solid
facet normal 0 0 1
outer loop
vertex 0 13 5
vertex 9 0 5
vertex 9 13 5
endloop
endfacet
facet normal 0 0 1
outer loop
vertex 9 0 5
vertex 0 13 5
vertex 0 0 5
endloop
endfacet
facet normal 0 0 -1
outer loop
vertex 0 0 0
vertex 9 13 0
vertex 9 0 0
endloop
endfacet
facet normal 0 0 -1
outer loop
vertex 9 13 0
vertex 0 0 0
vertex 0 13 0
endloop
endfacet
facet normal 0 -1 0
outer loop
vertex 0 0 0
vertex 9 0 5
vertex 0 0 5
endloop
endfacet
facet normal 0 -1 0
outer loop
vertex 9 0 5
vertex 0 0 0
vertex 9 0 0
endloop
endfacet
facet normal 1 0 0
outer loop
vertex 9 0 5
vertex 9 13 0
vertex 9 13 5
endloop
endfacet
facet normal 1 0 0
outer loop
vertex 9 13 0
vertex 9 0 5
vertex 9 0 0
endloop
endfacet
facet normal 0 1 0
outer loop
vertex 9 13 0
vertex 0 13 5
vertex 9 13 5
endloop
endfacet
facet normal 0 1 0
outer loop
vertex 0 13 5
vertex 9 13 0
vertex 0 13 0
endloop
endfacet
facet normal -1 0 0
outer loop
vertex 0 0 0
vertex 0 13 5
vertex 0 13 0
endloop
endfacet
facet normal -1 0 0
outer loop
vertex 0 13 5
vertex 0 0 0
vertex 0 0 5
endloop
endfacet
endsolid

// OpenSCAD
// Generated by SolidPython 1.0.1 on 2020-07-29 00:46:55


cube(size = [9, 13, 5]);
/***********************************************
*********      SolidPython code:      **********
************************************************
 
# import packages: SolidPython
from solid import *
from solid.utils import *
from itertools import chain, combinations, permutations


class Resize:

    def __init__(self, scad_file):
        self.scad_file = scad_file
        #self.scad_file = import_scad(scad_file)
        # cone/cylinder param:
        self.r1 = 0
        self.r2 = 0
        self.h = 0
        # rectangular prism param:
        self.w = 0
        self.l = 0
        # ellipse param:
        self.r = 0

    # import OpenScad code (file name corresponds to shape)


    # classify shape + parameters
    def assign(self, param1, param2, param3):
        if self.scad_file == 'cone.scad':
            self.r1 = param1
            self.r2 = param2
            self.h = param3
        elif self.scad_file == 'cylinder.scad':
            self.r1 = param1
            self.r2 = param2
            self.h = param3
        elif self.scad_file == 'rectangularPrism.scad':
            self.h = param1
            self.l = param2
            self.w = param3
        else:
            self.r = param1
            self.h = param2

    # resize parameters
    def iterate(self):
        x = range(3, 20, 2)
        i = 1
        if self.scad_file == 'cone.scad':
            tempList = list(permutations(x, 2))
            for temp in tempList:
                param1 = temp[0]
                param2 = temp[1]
                filepath = 'produced_scad_files/' + 'cone' + str(param1) + '_' + str(param2) + '_' + '.scad'
                scad_render_to_file(cylinder(h=param1, r1=param2, r2=0), filepath)

        elif self.scad_file == 'cylinder.scad':
            tempList = list(permutations(x, 3))
            for temp in tempList:
                param1 = temp[0]
                param2 = temp[1]
                filepath = 'produced_scad_files/' + 'cylinder' + str(param1) + '_' + str(param2) + '_' + '.scad'
                scad_render_to_file(cylinder(h=param1, r1=param2, r2=param2), filepath)

        elif self.scad_file == 'rectangularPrism.scad':
            tempList = list(permutations(x, 3))
            for temp in tempList:
                param1 = temp[0]
                param2 = temp[1]
                param3 = temp[2]
                filepath = 'produced_scad_files/' + 'rectangularPrism' + str(param1) + '_' + str(param2) + '_' + str(
                    param3) + '.scad'
                scad_render_to_file(cube(size=(param1, param2, param3)), filepath)

        elif self.scad_file == 'ellipse.scad':
            tempList = list(permutations(x, 4))
            for temp in tempList:
                param1 = temp[0]
                param2 = temp[1]
                param3 = temp[2]
                param4 = temp[3]
                filepath = 'produced_scad_files/' + 'ellipse' + str(param1) + '_' + str(param2) + '_' + str(param3) + '_' + str(param4) + '.scad'
                scad_render_to_file(scale([param1, param2, param3])(sphere(r=param4)), filepath)

    def render_to_scadfile(self):
        scad_render_to_file(scad, 'example.scad') 
 
************************************************/
